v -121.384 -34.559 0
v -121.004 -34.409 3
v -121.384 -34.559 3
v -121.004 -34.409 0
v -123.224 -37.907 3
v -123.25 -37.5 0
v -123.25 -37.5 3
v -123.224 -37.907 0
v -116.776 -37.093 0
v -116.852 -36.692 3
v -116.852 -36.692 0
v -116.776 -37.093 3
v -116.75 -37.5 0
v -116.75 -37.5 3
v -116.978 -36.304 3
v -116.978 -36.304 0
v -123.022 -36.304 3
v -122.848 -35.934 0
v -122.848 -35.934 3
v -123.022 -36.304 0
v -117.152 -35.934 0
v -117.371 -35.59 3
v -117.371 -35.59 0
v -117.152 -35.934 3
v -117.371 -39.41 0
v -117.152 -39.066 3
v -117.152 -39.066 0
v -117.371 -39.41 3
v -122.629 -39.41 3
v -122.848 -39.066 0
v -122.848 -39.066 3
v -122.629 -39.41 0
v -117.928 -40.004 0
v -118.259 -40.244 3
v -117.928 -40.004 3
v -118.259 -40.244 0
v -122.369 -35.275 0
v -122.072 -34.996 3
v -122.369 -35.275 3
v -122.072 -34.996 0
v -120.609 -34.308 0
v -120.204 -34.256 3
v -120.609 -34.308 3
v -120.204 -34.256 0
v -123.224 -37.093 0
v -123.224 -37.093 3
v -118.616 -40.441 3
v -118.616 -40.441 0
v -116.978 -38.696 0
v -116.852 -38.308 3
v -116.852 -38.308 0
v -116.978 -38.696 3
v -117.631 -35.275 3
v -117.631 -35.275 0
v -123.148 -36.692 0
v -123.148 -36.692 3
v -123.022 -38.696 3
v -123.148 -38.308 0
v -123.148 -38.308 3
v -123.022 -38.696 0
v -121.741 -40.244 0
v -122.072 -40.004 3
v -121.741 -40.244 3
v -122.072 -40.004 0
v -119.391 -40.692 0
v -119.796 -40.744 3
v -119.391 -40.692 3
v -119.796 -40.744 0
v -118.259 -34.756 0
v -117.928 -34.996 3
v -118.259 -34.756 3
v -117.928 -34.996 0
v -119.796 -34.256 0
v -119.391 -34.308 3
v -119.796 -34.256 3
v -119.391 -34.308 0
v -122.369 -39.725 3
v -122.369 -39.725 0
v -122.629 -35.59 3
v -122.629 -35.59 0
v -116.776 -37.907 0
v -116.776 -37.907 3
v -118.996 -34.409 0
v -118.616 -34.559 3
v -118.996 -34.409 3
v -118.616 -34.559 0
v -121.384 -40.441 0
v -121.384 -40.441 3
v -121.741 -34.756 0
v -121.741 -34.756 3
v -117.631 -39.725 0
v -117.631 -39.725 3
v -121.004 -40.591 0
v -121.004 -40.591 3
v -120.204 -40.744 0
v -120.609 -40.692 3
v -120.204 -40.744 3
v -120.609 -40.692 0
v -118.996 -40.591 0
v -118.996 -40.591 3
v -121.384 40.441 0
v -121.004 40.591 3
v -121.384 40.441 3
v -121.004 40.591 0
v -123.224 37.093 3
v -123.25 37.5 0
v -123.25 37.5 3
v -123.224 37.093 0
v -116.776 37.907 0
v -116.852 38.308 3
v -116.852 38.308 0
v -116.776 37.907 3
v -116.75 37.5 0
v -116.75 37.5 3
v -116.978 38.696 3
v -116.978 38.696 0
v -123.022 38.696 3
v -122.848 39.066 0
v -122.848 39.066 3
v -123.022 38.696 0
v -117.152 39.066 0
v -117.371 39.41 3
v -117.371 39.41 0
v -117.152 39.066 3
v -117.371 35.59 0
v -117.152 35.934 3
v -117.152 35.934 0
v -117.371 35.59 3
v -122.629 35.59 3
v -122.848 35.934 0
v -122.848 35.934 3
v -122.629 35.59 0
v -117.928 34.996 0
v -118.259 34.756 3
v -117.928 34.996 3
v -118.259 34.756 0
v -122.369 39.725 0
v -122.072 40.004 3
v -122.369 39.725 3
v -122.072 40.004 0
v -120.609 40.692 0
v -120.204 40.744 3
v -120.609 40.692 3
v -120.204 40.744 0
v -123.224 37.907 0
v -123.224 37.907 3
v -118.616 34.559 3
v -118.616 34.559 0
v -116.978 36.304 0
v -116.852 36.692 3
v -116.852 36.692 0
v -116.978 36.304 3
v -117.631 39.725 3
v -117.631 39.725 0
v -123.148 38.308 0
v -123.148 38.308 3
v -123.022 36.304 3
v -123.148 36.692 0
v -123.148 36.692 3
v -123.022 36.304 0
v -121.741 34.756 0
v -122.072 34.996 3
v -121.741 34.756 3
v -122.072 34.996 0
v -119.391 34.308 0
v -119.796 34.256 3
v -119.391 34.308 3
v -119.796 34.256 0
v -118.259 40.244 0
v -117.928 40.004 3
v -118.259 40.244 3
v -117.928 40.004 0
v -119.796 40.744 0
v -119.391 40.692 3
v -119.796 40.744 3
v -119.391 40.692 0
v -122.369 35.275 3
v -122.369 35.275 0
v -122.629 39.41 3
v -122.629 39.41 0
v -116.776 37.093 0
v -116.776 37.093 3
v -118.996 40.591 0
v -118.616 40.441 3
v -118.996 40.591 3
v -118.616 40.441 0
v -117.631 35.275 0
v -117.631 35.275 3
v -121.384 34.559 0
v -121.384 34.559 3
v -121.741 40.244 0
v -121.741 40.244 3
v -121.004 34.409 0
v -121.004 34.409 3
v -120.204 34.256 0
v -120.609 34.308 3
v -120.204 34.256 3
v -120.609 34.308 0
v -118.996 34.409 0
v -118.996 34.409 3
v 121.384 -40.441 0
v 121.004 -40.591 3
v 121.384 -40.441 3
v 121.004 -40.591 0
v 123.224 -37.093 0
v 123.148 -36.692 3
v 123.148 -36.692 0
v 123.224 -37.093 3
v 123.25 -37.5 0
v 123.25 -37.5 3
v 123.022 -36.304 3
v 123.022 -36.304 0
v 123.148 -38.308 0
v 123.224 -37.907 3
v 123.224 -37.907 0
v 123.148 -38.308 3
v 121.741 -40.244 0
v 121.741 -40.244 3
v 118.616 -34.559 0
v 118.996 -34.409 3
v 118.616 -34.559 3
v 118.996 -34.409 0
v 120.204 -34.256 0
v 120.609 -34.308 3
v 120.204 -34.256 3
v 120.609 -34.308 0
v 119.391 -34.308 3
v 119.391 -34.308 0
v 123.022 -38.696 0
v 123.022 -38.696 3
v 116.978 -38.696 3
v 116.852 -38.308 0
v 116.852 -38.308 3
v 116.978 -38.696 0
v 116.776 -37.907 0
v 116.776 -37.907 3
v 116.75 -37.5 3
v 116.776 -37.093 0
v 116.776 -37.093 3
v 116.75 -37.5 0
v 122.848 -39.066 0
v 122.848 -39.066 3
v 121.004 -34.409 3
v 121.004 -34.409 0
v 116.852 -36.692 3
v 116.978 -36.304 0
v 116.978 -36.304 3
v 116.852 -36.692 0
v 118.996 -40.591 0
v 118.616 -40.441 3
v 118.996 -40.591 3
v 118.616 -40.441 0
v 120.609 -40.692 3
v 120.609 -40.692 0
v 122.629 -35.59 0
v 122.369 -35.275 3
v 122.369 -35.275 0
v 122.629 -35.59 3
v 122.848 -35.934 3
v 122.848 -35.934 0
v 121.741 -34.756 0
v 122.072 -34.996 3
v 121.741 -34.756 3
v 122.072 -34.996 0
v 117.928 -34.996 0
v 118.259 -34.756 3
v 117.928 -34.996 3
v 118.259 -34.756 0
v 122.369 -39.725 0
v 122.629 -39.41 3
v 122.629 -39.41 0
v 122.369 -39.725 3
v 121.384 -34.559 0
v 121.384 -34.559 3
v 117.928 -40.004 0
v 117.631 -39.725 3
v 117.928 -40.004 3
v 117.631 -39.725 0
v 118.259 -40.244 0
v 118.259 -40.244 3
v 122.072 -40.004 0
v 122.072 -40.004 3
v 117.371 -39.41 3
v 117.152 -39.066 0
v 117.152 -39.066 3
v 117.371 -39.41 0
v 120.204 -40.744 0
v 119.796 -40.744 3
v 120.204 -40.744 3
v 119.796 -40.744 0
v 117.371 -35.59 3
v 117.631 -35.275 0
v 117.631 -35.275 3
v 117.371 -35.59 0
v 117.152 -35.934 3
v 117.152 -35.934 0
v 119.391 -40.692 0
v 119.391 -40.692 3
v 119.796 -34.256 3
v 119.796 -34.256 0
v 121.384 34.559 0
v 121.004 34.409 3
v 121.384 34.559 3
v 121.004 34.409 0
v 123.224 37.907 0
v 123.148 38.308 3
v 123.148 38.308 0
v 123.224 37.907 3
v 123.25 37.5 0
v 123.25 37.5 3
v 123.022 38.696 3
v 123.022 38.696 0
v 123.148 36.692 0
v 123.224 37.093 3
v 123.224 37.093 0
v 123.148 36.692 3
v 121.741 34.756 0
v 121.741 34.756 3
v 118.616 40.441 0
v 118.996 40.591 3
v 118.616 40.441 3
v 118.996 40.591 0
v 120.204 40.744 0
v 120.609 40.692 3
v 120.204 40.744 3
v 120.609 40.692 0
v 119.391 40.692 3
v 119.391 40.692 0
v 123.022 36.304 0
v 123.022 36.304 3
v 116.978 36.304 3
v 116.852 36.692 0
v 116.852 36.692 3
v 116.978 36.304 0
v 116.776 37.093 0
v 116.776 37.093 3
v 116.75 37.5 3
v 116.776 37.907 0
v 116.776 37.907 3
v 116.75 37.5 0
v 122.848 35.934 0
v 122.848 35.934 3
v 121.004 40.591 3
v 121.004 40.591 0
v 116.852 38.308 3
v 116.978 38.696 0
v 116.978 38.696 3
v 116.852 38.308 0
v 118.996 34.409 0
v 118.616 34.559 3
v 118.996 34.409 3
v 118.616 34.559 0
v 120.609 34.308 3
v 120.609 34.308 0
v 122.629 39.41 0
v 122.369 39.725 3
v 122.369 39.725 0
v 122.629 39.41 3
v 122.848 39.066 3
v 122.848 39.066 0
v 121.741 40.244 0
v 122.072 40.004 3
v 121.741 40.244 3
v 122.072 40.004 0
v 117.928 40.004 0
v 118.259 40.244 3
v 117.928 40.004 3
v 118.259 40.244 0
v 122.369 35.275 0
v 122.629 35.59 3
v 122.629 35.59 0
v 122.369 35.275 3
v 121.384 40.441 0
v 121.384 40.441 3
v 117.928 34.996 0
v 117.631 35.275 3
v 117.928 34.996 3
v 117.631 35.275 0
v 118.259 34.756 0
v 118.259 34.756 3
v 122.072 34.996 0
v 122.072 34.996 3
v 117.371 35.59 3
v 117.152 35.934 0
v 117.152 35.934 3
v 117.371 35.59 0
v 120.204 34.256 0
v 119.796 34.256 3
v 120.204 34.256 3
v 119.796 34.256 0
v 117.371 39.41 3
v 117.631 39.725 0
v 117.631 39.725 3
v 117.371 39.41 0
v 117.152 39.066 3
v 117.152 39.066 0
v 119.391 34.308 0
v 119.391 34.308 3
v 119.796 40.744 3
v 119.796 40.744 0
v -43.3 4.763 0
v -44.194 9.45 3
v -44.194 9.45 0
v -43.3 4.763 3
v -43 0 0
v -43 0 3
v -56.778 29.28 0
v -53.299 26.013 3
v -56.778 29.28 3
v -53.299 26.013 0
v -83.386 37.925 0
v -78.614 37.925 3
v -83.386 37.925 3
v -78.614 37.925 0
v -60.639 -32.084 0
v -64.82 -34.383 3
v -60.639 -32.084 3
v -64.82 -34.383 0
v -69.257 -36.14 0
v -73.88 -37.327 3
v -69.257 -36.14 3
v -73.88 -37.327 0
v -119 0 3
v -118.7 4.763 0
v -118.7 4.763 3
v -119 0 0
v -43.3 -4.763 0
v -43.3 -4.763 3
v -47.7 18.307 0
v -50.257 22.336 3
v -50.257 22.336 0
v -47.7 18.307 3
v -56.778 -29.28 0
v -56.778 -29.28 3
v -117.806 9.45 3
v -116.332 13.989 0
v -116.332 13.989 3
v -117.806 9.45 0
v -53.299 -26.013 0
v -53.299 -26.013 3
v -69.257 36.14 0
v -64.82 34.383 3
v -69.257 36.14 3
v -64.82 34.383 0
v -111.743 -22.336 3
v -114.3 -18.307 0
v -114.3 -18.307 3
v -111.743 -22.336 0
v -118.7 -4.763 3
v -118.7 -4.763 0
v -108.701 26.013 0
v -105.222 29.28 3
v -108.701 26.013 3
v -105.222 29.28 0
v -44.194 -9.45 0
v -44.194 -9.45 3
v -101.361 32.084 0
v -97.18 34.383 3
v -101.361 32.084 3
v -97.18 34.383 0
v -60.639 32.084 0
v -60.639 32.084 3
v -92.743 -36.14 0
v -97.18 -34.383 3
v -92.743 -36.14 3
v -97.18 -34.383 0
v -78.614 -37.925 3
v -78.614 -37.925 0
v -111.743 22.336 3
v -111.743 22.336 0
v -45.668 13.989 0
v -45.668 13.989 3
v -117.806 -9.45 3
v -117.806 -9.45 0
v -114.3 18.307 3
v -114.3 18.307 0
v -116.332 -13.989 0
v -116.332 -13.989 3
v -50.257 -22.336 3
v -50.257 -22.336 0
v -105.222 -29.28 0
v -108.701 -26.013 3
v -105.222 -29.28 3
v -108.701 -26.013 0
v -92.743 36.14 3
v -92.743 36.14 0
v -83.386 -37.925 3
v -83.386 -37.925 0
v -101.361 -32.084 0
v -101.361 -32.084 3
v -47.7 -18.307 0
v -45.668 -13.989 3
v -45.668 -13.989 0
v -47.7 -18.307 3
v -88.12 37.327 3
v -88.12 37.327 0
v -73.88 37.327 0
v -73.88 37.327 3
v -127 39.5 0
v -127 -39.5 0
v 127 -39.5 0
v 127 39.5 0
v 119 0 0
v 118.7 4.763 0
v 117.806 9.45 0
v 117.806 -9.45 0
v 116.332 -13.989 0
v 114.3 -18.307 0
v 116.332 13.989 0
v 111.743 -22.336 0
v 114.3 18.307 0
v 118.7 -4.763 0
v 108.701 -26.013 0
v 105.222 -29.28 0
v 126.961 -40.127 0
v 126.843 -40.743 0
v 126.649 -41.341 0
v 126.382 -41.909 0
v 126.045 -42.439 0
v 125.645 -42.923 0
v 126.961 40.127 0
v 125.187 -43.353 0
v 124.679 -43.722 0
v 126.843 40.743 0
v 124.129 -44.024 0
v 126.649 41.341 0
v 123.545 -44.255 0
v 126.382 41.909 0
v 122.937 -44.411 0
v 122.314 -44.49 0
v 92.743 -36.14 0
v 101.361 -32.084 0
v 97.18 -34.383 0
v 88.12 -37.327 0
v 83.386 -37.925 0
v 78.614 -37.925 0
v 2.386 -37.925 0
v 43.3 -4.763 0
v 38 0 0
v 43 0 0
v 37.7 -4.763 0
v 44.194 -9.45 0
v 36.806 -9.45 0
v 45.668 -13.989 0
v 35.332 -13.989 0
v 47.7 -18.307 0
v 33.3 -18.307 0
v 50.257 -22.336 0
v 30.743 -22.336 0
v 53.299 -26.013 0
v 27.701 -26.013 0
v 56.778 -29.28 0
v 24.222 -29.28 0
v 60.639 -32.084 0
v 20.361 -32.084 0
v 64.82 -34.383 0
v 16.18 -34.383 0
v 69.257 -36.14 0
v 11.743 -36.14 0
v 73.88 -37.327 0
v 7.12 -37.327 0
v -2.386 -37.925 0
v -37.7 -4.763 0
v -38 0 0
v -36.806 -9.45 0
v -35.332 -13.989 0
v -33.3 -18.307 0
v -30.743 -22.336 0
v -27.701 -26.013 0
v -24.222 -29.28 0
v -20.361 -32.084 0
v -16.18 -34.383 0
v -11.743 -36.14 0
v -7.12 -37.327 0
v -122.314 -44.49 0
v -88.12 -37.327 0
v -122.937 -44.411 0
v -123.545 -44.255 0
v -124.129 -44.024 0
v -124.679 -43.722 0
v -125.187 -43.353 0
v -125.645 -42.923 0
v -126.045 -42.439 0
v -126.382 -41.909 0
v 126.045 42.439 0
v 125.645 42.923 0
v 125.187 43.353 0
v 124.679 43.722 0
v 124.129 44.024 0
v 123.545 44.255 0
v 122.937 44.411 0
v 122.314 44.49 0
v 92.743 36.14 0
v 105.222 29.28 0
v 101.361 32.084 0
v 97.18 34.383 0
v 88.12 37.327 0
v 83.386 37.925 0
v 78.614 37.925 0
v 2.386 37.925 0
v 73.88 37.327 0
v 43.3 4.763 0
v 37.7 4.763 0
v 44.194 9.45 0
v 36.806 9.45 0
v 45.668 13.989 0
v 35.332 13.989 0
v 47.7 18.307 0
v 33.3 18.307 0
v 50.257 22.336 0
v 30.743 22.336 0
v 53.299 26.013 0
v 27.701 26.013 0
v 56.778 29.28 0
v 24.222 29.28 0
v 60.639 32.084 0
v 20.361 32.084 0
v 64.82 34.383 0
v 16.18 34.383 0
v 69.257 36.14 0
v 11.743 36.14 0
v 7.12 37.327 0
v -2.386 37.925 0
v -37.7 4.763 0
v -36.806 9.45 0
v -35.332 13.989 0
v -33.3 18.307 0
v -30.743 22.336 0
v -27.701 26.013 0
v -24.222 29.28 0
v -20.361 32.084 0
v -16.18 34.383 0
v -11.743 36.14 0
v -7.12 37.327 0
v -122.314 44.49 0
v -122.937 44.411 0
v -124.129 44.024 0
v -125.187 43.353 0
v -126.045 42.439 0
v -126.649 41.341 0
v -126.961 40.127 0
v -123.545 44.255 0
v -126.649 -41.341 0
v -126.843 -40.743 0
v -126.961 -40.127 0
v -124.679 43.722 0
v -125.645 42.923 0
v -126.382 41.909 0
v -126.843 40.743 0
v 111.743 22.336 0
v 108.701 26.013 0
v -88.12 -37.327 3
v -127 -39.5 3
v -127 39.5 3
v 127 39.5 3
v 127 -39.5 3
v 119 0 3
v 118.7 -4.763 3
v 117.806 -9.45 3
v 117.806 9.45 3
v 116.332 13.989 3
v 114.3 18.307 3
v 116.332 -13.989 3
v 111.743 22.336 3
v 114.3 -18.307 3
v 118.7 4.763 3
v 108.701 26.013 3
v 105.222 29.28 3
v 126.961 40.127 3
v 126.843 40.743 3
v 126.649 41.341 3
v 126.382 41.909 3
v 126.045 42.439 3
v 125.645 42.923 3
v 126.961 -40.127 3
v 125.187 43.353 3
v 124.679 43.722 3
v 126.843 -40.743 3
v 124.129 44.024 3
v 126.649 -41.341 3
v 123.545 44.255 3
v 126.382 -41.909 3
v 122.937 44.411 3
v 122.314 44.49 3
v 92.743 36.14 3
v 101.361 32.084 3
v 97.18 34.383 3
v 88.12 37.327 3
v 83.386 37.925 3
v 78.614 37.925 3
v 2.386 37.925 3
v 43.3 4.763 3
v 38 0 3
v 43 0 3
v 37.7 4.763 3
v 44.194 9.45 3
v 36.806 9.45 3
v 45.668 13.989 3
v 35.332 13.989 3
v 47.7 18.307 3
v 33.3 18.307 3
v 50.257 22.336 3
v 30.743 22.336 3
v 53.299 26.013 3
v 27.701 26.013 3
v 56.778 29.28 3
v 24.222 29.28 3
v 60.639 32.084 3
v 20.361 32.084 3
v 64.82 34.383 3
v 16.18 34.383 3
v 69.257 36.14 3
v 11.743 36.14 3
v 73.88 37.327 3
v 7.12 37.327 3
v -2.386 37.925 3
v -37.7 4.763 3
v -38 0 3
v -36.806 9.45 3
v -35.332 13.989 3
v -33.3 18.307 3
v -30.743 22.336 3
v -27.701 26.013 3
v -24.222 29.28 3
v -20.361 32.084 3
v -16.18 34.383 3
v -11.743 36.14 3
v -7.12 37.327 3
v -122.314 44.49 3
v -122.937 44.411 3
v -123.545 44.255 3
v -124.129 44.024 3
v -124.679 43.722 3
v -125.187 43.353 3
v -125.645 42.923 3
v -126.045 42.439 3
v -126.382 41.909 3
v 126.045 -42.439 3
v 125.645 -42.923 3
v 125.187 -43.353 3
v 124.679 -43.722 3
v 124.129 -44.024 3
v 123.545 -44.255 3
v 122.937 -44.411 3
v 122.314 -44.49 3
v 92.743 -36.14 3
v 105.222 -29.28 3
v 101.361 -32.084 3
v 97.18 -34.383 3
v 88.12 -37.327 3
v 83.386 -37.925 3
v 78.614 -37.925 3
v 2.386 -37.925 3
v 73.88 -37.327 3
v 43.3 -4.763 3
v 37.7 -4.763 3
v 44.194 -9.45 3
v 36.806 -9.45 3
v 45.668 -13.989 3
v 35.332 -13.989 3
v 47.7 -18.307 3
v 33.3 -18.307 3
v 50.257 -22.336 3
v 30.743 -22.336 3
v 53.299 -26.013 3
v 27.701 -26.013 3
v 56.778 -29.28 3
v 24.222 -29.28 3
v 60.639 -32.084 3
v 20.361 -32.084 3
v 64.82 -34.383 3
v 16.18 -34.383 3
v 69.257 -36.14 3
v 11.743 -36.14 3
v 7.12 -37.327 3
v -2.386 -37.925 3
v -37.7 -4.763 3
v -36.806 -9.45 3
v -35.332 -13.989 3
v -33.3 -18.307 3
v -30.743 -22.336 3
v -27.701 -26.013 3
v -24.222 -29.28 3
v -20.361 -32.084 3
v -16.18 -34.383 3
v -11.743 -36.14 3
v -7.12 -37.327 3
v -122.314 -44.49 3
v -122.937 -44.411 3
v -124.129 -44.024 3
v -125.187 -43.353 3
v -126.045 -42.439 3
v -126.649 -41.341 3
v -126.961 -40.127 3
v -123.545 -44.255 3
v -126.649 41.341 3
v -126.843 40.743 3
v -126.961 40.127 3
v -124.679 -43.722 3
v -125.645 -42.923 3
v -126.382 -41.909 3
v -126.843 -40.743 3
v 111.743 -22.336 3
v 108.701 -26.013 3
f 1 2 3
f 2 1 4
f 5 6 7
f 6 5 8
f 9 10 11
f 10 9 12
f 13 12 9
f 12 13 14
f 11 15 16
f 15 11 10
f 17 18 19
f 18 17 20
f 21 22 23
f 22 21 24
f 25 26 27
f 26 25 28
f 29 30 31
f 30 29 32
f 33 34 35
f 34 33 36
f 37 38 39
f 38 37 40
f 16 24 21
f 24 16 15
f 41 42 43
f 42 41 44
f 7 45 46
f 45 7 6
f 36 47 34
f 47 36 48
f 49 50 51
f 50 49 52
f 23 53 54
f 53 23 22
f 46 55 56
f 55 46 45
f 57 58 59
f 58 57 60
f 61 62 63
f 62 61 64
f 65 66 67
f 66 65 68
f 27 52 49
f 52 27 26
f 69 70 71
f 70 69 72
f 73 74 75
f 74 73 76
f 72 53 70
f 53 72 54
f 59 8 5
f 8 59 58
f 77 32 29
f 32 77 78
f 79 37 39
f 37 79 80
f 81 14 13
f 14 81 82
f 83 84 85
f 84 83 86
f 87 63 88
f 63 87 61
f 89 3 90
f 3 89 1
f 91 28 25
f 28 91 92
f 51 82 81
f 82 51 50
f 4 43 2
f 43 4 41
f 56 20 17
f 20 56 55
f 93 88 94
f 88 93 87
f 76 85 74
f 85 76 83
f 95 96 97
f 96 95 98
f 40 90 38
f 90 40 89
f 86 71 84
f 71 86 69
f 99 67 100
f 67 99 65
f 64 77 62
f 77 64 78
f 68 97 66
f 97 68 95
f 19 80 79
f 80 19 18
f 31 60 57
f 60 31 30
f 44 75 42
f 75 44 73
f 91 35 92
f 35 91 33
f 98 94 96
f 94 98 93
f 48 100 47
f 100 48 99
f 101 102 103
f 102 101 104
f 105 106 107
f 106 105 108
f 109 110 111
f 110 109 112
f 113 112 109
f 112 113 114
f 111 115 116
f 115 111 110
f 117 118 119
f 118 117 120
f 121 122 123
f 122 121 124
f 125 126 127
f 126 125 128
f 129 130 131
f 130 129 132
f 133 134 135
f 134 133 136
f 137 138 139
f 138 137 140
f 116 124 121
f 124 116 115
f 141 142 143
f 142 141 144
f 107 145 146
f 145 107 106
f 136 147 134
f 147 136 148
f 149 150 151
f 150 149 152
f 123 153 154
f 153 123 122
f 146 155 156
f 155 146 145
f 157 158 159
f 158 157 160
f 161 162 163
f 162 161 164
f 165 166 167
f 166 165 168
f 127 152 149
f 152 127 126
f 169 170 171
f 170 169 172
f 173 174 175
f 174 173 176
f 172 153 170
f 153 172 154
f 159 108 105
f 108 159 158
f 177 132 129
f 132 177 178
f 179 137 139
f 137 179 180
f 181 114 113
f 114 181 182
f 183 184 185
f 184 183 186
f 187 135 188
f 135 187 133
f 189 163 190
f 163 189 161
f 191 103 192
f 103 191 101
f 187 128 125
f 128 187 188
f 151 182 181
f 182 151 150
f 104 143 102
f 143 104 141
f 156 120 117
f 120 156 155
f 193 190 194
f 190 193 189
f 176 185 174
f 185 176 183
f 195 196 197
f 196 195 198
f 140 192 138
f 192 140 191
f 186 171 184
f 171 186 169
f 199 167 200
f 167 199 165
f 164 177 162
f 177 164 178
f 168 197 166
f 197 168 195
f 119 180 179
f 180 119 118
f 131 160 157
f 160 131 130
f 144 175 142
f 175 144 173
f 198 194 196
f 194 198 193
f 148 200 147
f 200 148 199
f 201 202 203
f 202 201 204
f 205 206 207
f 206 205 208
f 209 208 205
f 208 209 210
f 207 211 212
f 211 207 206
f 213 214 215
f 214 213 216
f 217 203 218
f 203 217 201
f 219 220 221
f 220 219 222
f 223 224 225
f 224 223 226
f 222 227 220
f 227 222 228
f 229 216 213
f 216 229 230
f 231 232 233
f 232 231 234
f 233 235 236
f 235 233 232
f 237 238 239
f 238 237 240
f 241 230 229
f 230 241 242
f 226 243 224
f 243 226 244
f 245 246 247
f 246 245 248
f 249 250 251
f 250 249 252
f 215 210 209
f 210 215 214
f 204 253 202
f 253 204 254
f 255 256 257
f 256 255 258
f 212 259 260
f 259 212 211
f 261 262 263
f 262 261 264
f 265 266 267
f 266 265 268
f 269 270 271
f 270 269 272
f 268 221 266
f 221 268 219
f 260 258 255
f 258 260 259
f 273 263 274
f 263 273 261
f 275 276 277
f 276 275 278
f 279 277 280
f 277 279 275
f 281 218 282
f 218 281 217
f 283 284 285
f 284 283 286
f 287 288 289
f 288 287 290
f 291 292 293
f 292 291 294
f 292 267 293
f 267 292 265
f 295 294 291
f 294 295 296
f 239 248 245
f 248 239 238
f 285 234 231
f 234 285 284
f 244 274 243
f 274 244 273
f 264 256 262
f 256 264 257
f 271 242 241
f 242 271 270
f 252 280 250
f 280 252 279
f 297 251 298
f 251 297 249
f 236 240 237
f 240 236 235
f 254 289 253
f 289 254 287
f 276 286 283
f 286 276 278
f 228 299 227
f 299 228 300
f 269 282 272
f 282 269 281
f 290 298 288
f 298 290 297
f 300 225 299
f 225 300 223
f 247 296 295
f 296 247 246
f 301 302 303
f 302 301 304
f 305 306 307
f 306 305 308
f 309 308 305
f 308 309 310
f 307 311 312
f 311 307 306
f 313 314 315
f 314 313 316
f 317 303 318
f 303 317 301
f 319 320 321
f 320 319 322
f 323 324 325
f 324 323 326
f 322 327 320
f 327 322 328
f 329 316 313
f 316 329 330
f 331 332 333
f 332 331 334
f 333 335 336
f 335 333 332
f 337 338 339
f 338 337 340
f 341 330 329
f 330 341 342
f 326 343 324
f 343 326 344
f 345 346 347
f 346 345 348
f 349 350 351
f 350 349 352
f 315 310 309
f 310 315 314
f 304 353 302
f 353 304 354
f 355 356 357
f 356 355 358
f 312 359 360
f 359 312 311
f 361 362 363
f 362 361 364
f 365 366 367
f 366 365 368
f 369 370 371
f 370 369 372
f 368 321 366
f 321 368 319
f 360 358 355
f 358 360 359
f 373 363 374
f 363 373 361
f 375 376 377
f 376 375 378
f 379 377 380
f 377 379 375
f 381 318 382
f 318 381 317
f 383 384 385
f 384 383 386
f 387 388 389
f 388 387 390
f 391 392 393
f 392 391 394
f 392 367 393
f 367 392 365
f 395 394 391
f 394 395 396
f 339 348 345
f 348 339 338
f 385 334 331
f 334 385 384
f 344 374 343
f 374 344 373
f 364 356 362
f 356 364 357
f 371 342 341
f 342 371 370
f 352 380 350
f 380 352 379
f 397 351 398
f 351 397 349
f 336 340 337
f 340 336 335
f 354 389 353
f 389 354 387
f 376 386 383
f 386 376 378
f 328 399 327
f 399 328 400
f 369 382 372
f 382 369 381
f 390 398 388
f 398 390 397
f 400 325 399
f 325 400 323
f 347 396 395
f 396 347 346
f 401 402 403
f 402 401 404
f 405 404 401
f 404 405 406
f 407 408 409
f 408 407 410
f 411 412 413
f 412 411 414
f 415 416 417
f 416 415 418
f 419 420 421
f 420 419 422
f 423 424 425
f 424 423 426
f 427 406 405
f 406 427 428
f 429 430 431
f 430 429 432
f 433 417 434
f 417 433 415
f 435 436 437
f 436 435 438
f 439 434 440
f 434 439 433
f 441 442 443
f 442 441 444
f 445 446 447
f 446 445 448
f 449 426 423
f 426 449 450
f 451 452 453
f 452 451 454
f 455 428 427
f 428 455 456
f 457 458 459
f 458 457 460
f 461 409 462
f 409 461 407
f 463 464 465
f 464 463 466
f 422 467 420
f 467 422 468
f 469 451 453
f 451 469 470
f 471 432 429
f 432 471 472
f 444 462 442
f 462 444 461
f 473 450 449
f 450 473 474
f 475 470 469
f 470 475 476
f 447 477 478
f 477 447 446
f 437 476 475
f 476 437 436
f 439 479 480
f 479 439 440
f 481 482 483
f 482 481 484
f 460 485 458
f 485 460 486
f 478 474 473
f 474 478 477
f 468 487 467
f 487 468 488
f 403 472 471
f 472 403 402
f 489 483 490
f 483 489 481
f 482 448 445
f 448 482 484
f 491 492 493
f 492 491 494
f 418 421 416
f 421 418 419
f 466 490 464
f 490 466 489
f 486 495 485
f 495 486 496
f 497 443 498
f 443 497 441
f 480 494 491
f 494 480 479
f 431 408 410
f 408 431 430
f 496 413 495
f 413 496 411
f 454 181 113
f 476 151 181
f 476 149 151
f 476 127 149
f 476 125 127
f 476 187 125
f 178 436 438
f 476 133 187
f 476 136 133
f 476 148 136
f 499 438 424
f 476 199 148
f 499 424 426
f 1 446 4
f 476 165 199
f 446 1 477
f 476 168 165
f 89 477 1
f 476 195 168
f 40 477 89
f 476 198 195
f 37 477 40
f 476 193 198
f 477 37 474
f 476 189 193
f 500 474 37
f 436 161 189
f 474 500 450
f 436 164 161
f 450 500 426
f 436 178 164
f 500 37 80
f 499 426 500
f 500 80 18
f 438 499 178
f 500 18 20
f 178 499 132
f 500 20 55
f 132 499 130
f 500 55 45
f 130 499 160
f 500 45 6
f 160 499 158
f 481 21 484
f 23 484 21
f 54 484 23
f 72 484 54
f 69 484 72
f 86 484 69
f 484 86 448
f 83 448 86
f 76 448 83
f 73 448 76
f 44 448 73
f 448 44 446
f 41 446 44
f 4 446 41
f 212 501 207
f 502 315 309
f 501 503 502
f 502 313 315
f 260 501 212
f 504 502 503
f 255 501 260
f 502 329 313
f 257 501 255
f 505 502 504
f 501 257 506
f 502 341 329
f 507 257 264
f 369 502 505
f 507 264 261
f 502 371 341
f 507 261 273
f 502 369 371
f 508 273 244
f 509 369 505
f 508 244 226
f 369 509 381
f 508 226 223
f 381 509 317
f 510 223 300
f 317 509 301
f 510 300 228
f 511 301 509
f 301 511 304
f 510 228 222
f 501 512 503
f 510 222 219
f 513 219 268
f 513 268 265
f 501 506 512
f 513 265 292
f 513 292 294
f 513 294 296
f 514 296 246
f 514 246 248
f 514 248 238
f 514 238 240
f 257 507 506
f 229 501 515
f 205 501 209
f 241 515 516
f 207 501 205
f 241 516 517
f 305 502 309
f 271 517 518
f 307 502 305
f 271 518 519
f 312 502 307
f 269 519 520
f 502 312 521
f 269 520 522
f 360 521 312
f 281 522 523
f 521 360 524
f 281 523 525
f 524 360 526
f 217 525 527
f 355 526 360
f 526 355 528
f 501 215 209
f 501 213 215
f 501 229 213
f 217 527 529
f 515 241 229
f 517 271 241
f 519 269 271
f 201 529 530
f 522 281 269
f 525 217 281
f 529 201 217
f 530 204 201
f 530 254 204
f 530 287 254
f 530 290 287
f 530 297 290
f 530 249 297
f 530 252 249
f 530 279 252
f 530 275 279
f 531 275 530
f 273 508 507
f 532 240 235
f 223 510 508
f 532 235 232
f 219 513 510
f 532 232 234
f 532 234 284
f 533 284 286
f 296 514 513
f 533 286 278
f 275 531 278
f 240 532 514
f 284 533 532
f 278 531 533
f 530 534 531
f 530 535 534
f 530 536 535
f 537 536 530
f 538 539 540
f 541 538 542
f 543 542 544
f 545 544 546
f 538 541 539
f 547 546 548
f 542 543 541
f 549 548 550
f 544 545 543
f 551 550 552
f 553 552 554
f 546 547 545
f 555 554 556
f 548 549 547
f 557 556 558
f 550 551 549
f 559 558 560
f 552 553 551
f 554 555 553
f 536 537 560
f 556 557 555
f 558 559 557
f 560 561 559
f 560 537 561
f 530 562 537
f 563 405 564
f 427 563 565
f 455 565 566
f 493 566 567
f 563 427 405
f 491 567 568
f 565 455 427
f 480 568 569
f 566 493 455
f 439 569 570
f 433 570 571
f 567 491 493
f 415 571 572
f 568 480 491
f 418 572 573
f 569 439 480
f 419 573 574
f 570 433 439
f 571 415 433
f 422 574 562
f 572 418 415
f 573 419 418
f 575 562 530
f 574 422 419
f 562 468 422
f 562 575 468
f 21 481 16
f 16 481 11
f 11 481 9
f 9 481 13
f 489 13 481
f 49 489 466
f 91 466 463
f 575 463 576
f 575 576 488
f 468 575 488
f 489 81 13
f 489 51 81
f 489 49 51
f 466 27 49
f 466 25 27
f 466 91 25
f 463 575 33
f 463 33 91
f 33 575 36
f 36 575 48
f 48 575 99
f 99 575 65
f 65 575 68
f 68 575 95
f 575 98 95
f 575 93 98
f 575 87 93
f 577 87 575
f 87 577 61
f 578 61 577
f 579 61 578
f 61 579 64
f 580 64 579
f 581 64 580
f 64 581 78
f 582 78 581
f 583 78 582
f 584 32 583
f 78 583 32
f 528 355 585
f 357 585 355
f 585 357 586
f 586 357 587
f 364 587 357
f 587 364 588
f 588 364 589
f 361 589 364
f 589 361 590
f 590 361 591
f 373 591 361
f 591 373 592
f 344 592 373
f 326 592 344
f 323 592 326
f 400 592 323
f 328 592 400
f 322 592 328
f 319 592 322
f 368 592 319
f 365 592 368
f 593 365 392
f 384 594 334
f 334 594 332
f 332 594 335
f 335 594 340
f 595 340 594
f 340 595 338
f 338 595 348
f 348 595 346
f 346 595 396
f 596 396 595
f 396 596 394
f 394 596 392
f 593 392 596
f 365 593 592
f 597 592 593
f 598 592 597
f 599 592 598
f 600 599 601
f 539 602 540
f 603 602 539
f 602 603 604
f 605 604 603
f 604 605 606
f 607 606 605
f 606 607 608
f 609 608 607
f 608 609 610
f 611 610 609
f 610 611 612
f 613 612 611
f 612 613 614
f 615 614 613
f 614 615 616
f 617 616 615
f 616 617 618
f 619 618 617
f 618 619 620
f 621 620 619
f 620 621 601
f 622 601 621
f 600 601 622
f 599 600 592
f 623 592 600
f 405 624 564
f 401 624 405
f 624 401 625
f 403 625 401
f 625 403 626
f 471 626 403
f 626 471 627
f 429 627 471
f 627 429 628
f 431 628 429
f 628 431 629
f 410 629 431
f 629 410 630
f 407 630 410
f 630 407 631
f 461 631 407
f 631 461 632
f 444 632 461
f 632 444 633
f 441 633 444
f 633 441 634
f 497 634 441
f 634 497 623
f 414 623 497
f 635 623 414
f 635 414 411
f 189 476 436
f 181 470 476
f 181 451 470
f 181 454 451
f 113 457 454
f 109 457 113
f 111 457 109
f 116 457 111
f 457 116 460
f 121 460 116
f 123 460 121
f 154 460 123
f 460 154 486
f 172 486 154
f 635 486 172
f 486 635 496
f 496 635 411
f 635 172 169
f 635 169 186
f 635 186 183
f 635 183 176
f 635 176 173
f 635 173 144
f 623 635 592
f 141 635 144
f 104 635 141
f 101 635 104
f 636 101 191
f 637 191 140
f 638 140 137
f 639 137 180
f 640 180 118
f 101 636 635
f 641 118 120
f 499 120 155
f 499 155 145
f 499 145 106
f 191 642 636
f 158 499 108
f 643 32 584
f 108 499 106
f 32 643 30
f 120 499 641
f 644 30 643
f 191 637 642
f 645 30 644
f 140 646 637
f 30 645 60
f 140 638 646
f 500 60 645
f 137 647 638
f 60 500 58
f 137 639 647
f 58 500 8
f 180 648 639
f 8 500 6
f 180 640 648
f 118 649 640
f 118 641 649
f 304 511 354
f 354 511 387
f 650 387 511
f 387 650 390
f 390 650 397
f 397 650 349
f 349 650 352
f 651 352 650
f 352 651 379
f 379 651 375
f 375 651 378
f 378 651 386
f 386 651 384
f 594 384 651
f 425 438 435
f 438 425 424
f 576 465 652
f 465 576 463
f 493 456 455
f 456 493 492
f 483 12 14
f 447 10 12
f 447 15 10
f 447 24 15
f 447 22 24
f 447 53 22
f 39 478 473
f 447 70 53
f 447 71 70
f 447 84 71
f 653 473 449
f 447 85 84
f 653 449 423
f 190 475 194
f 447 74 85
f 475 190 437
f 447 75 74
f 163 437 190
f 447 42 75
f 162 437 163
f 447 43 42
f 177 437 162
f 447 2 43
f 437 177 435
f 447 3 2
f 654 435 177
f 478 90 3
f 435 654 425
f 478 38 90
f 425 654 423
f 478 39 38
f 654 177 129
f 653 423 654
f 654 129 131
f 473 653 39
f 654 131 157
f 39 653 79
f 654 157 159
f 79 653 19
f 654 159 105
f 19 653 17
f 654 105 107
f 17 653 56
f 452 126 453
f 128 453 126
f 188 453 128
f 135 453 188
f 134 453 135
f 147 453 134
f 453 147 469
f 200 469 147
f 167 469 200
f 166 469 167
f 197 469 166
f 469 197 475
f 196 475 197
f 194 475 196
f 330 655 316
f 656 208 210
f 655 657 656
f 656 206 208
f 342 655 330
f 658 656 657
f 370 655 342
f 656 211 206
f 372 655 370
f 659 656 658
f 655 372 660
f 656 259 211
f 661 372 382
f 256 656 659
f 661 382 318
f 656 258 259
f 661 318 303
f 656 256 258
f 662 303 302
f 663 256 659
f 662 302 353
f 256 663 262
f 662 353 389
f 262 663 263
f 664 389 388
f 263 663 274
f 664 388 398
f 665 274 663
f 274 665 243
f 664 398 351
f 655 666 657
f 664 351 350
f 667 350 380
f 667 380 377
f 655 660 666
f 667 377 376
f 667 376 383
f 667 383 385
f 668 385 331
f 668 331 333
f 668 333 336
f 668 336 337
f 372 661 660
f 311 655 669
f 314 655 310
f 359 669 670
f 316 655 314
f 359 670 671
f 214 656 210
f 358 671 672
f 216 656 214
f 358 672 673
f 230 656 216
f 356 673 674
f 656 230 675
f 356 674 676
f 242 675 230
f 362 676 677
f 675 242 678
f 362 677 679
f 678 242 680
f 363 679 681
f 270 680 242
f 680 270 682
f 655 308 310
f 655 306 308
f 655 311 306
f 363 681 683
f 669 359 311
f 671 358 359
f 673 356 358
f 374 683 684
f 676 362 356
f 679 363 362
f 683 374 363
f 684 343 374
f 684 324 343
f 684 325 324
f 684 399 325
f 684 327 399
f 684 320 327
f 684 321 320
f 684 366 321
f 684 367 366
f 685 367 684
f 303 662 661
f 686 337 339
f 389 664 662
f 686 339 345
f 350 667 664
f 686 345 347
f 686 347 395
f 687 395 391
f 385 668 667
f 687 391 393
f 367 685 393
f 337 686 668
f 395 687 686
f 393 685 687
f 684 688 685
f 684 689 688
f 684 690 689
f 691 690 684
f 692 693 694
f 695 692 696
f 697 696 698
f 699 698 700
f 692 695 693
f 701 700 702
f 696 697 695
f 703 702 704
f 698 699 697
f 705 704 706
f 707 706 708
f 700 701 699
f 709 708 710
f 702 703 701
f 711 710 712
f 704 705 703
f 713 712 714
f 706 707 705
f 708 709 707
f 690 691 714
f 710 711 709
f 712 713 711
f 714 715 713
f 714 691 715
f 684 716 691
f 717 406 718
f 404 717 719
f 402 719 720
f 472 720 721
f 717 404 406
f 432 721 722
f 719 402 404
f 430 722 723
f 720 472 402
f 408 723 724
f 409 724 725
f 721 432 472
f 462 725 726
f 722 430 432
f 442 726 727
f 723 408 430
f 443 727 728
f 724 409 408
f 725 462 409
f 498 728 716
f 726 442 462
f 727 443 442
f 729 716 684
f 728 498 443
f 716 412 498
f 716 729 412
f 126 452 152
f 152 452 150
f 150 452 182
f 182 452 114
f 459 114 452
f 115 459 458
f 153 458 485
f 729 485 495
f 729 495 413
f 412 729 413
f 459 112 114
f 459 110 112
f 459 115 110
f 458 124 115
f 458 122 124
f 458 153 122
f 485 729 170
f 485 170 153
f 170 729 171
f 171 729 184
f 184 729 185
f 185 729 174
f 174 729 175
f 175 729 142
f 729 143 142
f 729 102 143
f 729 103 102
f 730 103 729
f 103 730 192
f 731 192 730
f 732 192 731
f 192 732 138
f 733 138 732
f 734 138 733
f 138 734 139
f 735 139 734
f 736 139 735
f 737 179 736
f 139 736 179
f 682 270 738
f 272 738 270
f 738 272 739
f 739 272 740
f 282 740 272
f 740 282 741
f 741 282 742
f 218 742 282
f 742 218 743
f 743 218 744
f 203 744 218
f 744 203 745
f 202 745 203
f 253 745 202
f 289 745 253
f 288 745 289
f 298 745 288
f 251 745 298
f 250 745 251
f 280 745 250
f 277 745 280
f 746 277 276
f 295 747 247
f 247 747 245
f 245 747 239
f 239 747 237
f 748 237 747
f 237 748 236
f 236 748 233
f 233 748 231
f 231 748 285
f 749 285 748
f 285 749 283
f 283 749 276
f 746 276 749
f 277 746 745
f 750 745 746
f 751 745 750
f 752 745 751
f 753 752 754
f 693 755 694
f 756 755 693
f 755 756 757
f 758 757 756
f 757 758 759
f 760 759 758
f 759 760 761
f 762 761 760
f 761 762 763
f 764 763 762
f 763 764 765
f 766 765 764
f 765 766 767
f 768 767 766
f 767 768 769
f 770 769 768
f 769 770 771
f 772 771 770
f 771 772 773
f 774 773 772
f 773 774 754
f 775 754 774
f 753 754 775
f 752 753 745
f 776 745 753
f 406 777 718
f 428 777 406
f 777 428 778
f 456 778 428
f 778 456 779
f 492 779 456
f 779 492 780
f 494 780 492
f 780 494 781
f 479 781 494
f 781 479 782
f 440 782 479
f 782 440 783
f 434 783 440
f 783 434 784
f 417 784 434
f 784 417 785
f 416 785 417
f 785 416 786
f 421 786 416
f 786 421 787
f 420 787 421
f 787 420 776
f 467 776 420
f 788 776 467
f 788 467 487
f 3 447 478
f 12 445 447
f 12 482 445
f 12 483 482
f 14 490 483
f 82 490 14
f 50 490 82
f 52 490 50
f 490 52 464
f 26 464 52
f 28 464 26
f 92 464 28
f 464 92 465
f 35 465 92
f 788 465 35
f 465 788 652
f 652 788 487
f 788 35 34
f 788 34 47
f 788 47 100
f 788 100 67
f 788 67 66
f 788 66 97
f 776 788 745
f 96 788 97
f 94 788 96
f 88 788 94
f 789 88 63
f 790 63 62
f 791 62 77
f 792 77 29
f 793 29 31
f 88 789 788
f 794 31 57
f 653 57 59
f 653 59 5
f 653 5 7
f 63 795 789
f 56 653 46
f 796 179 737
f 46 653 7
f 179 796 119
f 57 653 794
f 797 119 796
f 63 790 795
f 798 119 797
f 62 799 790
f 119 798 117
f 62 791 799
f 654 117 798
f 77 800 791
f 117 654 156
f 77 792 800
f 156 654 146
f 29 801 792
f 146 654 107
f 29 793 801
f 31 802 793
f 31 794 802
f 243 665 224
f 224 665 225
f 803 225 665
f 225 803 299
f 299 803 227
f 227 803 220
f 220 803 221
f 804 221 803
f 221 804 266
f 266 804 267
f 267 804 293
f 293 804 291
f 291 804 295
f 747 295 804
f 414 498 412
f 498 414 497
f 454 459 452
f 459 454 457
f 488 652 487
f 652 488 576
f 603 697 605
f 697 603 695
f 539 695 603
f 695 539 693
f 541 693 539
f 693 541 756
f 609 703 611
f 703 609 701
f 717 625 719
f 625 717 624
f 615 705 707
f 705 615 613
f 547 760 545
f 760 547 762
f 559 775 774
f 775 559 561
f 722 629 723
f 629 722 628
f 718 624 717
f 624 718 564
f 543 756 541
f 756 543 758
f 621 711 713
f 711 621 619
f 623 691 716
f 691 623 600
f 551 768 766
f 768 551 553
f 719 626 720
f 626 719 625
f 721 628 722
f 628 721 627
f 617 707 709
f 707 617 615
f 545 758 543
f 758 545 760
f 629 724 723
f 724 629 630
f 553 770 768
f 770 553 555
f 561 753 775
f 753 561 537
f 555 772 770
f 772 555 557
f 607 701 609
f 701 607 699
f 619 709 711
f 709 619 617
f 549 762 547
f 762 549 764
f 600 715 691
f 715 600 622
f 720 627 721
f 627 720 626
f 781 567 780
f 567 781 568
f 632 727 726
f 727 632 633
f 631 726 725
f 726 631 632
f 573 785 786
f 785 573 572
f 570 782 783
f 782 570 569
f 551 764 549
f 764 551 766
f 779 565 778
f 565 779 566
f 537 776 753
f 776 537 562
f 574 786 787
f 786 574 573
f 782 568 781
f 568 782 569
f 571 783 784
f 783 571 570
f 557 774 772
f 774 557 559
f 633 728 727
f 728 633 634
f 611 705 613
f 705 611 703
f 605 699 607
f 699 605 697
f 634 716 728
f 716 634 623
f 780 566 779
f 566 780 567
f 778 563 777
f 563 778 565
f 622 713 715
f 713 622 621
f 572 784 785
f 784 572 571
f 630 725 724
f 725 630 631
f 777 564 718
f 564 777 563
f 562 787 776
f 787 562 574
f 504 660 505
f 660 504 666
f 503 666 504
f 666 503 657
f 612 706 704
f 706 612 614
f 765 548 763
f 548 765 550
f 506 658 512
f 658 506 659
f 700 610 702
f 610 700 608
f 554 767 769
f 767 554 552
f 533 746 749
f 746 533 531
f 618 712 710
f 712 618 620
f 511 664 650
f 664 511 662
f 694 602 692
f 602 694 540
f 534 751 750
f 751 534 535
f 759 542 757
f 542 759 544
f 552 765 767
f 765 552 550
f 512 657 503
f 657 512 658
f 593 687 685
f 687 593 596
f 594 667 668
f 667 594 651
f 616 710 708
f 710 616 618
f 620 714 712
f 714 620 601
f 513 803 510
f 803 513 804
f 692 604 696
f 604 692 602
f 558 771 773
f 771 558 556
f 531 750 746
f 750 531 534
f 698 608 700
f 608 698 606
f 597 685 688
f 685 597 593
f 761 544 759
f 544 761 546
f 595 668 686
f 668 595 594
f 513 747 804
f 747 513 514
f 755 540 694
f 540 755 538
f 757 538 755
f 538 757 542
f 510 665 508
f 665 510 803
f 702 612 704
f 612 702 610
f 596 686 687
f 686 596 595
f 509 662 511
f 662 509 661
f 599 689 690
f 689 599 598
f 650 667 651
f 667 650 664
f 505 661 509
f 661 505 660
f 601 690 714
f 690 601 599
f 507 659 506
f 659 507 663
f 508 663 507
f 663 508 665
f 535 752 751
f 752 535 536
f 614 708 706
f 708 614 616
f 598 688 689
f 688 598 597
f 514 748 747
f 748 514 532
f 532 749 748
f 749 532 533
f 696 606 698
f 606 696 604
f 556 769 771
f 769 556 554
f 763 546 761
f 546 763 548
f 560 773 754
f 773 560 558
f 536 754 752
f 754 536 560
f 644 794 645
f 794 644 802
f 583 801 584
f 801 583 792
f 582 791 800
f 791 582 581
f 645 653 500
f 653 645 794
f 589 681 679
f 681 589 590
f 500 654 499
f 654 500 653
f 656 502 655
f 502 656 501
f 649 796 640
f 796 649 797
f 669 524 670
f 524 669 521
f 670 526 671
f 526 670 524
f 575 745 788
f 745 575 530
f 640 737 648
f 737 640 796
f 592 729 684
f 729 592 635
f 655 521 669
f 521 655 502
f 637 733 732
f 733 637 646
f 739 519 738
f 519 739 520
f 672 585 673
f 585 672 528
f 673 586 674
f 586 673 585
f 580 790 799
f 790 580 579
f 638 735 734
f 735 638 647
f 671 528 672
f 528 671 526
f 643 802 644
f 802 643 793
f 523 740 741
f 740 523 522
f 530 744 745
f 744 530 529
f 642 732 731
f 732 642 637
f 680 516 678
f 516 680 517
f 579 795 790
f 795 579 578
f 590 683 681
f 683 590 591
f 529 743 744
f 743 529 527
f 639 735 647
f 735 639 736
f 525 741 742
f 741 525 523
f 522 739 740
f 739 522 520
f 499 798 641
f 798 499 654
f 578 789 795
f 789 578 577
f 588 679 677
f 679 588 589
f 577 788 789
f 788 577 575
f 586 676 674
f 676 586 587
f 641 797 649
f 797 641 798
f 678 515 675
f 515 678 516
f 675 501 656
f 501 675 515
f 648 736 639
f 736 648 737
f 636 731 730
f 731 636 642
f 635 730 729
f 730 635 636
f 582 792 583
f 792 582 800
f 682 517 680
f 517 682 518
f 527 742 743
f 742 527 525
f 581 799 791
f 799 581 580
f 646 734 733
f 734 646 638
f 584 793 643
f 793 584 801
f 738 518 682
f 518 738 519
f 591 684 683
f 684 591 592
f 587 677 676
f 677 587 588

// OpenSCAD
$fn = 50;

difference() {
	union() {
		hull() {
			translate(v = [-122.0, 39.5, 0]) {
				cylinder(h = 3, r = 5);
			}
			translate(v = [122.0, 39.5, 0]) {
				cylinder(h = 3, r = 5);
			}
			translate(v = [-122.0, -39.5, 0]) {
				cylinder(h = 3, r = 5);
			}
			translate(v = [122.0, -39.5, 0]) {
				cylinder(h = 3, r = 5);
			}
		}
	}
	union() {
		translate(v = [-120.0, -37.5, -100.0]) {
			cylinder(h = 200, r = 3.25);
		}
		translate(v = [-120.0, 37.5, -100.0]) {
			cylinder(h = 200, r = 3.25);
		}
		translate(v = [120.0, -37.5, -100.0]) {
			cylinder(h = 200, r = 3.25);
		}
		translate(v = [120.0, 37.5, -100.0]) {
			cylinder(h = 200, r = 3.25);
		}
		translate(v = [-120.0, -37.5, -100.0]) {
			cylinder(h = 200, r = 1.8);
		}
		translate(v = [-120.0, 37.5, -100.0]) {
			cylinder(h = 200, r = 1.8);
		}
		translate(v = [120.0, -37.5, -100.0]) {
			cylinder(h = 200, r = 1.8);
		}
		translate(v = [120.0, 37.5, -100.0]) {
			cylinder(h = 200, r = 1.8);
		}
		translate(v = [-81.0, 0, 0.0]) {
			cylinder(h = 3, r = 38.0);
		}
		cylinder(h = 3, r = 38.0);
		translate(v = [81.0, 0, 0.0]) {
			cylinder(h = 3, r = 38.0);
		}
	}
}
